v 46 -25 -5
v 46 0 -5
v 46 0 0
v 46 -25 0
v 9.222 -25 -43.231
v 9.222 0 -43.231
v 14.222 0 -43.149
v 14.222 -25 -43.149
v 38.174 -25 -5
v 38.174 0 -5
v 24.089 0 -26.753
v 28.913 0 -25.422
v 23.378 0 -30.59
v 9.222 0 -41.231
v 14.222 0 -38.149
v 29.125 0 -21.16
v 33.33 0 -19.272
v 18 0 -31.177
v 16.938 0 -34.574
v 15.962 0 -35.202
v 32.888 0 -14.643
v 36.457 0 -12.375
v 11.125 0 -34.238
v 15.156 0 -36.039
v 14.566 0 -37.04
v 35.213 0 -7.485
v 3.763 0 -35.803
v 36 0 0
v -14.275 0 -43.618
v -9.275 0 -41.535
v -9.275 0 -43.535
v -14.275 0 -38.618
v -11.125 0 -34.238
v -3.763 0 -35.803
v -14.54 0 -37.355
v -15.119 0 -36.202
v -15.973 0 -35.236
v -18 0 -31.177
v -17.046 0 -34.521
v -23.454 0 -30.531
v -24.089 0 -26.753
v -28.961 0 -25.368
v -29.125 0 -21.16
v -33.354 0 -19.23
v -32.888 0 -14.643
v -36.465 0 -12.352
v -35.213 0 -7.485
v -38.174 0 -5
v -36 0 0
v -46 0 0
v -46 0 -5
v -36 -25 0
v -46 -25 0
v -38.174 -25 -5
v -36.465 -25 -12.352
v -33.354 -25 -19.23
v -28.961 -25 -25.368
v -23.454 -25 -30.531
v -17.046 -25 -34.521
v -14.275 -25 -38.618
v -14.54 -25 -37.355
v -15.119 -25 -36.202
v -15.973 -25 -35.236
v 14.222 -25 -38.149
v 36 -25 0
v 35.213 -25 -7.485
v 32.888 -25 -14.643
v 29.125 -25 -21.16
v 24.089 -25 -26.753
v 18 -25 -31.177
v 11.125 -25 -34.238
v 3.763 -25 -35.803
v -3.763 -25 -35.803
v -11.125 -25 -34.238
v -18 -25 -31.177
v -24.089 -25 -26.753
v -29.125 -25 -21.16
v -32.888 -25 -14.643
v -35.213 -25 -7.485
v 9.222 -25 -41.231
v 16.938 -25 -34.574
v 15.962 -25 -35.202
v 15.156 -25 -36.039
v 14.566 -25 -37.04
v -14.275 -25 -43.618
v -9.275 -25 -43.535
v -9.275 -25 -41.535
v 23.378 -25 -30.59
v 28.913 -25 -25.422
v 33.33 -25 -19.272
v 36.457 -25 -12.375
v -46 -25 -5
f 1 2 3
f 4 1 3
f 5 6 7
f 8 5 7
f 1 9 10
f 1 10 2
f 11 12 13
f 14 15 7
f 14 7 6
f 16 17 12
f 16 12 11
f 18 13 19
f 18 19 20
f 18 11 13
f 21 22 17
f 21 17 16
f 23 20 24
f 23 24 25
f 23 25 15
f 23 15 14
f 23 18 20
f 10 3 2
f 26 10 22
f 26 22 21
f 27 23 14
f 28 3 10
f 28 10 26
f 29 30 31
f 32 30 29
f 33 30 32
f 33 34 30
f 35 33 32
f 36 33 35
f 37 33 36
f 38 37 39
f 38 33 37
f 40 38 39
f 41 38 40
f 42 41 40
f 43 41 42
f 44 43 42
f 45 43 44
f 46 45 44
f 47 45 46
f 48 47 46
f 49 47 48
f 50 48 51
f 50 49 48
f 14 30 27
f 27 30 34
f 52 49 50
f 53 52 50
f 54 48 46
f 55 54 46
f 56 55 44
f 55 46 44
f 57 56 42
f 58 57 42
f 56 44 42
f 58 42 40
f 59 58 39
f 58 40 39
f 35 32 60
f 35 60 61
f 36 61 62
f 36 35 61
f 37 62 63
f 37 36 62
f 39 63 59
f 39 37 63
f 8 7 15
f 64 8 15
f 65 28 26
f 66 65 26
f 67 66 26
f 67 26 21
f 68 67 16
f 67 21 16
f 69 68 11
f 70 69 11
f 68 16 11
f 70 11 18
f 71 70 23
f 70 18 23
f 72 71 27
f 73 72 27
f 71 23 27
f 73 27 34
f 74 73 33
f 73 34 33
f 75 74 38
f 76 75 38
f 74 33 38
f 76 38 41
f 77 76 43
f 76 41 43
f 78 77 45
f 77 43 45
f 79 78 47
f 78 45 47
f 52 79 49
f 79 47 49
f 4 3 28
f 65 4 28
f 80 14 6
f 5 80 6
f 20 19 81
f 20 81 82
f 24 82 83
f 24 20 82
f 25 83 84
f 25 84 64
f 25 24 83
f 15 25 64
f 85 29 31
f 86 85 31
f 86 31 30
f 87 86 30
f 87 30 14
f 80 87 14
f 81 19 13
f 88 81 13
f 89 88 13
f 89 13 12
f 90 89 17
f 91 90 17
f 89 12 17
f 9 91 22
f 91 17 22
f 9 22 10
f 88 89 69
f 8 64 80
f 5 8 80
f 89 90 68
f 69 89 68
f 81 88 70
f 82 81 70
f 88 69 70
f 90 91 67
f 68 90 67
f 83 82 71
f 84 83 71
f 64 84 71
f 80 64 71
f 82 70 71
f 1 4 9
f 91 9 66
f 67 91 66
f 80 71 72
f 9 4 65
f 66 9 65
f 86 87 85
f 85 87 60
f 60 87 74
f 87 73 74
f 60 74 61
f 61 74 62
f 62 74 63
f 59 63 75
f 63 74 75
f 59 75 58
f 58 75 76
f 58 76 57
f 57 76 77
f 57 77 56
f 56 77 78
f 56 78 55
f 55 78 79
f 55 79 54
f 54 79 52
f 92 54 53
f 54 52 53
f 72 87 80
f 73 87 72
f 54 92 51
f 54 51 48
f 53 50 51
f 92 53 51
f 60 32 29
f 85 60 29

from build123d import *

# Parameters (mm, degrees)
F1_DEPTH    = 25
F2_T1_DEPTH = 25


# Not quite as in the source:
# - a fillet or chamfer that OpenCascade refuses, or shapes differently, is made with other operations: its cross-section is extruded or revolved along the edge and cut away or added


with BuildPart() as f1:
    # F0 (on Front) → F1 (new body)
    with BuildSketch(Plane.XZ):
        with BuildLine():
            ThreePointArc((36, 0), (0, -36), (-36, 0))
            Line((-36, 0), (-38.5, 0))
            Line((-38.5, 0), (-46, 0))
            Line((-46, 0), (-46, -5))
            Line((-46, -5), (-38.1739439933, -5))
            ThreePointArc((-38.1739439933, -5), (-26.2977937101, -28.1189623916), (-2.4365316343, -38.4228228218))
            Line((-2.4365316343, -38.4228228218), (-14.2752447595, -38.6175373625))
            Line((-14.2752447595, -38.6175373625), (-14.2752447595, -43.6175822914))
            Line((-14.2752447595, -43.6175822914), (-9.2752447595, -43.5353459289))
            Line((-9.2752447595, -43.5353459289), (-9.2752447595, -41.5353459289))
            Line((-9.2752447595, -41.5353459289), (9.222253505, -41.2311125346))
            Line((9.222253505, -41.2311125346), (9.222253505, -43.2311125346))
            Line((9.222253505, -43.2311125346), (14.222253505, -43.1488761722))
            Line((14.222253505, -43.1488761722), (14.222253505, -38.1488312433))
            Line((14.222253505, -38.1488312433), (3.6987732294, -38.3219137909))
            ThreePointArc((3.6987732294, -38.3219137909), (26.7566551829, -27.682691405), (38.1739439933, -5))
            Line((38.1739439933, -5), (46, -5))
            Line((46, -5), (46, 0))
            Line((46, 0), (38.5, 0))
            Line((38.5, 0), (36, 0))
        make_face()
    extrude(amount=F1_DEPTH)

    # F2: fillet of radius 5 on 2 edges, made by hand

    # F2_s2 → F2_t1 (join)
    with BuildSketch(Plane.XZ):
        with BuildLine():
            ThreePointArc((-14.2752447595, -38.6175373625), (-15.118767178, -36.2023611517), (-17.0464798519, -34.5205377226))
            ThreePointArc((-17.0464798519, -34.5205377226), (-9.9349832104, -37.1960496371), (-2.4365316343, -38.4228228218))
            Line((-2.4365316343, -38.4228228218), (-14.2752447595, -38.6175373625))
        make_face()
        with BuildLine():
            ThreePointArc((16.9380433228, -34.5738729158), (15.1563460299, -36.0394019773), (14.222253505, -38.1488312433))
            Line((14.222253505, -38.1488312433), (3.6987732294, -38.3219137909))
            ThreePointArc((3.6987732294, -38.3219137909), (10.4872065848, -37.0441425606), (16.9380433228, -34.5738729158))
        make_face()
    extrude(amount=F2_T1_DEPTH)


solid = f1.part
